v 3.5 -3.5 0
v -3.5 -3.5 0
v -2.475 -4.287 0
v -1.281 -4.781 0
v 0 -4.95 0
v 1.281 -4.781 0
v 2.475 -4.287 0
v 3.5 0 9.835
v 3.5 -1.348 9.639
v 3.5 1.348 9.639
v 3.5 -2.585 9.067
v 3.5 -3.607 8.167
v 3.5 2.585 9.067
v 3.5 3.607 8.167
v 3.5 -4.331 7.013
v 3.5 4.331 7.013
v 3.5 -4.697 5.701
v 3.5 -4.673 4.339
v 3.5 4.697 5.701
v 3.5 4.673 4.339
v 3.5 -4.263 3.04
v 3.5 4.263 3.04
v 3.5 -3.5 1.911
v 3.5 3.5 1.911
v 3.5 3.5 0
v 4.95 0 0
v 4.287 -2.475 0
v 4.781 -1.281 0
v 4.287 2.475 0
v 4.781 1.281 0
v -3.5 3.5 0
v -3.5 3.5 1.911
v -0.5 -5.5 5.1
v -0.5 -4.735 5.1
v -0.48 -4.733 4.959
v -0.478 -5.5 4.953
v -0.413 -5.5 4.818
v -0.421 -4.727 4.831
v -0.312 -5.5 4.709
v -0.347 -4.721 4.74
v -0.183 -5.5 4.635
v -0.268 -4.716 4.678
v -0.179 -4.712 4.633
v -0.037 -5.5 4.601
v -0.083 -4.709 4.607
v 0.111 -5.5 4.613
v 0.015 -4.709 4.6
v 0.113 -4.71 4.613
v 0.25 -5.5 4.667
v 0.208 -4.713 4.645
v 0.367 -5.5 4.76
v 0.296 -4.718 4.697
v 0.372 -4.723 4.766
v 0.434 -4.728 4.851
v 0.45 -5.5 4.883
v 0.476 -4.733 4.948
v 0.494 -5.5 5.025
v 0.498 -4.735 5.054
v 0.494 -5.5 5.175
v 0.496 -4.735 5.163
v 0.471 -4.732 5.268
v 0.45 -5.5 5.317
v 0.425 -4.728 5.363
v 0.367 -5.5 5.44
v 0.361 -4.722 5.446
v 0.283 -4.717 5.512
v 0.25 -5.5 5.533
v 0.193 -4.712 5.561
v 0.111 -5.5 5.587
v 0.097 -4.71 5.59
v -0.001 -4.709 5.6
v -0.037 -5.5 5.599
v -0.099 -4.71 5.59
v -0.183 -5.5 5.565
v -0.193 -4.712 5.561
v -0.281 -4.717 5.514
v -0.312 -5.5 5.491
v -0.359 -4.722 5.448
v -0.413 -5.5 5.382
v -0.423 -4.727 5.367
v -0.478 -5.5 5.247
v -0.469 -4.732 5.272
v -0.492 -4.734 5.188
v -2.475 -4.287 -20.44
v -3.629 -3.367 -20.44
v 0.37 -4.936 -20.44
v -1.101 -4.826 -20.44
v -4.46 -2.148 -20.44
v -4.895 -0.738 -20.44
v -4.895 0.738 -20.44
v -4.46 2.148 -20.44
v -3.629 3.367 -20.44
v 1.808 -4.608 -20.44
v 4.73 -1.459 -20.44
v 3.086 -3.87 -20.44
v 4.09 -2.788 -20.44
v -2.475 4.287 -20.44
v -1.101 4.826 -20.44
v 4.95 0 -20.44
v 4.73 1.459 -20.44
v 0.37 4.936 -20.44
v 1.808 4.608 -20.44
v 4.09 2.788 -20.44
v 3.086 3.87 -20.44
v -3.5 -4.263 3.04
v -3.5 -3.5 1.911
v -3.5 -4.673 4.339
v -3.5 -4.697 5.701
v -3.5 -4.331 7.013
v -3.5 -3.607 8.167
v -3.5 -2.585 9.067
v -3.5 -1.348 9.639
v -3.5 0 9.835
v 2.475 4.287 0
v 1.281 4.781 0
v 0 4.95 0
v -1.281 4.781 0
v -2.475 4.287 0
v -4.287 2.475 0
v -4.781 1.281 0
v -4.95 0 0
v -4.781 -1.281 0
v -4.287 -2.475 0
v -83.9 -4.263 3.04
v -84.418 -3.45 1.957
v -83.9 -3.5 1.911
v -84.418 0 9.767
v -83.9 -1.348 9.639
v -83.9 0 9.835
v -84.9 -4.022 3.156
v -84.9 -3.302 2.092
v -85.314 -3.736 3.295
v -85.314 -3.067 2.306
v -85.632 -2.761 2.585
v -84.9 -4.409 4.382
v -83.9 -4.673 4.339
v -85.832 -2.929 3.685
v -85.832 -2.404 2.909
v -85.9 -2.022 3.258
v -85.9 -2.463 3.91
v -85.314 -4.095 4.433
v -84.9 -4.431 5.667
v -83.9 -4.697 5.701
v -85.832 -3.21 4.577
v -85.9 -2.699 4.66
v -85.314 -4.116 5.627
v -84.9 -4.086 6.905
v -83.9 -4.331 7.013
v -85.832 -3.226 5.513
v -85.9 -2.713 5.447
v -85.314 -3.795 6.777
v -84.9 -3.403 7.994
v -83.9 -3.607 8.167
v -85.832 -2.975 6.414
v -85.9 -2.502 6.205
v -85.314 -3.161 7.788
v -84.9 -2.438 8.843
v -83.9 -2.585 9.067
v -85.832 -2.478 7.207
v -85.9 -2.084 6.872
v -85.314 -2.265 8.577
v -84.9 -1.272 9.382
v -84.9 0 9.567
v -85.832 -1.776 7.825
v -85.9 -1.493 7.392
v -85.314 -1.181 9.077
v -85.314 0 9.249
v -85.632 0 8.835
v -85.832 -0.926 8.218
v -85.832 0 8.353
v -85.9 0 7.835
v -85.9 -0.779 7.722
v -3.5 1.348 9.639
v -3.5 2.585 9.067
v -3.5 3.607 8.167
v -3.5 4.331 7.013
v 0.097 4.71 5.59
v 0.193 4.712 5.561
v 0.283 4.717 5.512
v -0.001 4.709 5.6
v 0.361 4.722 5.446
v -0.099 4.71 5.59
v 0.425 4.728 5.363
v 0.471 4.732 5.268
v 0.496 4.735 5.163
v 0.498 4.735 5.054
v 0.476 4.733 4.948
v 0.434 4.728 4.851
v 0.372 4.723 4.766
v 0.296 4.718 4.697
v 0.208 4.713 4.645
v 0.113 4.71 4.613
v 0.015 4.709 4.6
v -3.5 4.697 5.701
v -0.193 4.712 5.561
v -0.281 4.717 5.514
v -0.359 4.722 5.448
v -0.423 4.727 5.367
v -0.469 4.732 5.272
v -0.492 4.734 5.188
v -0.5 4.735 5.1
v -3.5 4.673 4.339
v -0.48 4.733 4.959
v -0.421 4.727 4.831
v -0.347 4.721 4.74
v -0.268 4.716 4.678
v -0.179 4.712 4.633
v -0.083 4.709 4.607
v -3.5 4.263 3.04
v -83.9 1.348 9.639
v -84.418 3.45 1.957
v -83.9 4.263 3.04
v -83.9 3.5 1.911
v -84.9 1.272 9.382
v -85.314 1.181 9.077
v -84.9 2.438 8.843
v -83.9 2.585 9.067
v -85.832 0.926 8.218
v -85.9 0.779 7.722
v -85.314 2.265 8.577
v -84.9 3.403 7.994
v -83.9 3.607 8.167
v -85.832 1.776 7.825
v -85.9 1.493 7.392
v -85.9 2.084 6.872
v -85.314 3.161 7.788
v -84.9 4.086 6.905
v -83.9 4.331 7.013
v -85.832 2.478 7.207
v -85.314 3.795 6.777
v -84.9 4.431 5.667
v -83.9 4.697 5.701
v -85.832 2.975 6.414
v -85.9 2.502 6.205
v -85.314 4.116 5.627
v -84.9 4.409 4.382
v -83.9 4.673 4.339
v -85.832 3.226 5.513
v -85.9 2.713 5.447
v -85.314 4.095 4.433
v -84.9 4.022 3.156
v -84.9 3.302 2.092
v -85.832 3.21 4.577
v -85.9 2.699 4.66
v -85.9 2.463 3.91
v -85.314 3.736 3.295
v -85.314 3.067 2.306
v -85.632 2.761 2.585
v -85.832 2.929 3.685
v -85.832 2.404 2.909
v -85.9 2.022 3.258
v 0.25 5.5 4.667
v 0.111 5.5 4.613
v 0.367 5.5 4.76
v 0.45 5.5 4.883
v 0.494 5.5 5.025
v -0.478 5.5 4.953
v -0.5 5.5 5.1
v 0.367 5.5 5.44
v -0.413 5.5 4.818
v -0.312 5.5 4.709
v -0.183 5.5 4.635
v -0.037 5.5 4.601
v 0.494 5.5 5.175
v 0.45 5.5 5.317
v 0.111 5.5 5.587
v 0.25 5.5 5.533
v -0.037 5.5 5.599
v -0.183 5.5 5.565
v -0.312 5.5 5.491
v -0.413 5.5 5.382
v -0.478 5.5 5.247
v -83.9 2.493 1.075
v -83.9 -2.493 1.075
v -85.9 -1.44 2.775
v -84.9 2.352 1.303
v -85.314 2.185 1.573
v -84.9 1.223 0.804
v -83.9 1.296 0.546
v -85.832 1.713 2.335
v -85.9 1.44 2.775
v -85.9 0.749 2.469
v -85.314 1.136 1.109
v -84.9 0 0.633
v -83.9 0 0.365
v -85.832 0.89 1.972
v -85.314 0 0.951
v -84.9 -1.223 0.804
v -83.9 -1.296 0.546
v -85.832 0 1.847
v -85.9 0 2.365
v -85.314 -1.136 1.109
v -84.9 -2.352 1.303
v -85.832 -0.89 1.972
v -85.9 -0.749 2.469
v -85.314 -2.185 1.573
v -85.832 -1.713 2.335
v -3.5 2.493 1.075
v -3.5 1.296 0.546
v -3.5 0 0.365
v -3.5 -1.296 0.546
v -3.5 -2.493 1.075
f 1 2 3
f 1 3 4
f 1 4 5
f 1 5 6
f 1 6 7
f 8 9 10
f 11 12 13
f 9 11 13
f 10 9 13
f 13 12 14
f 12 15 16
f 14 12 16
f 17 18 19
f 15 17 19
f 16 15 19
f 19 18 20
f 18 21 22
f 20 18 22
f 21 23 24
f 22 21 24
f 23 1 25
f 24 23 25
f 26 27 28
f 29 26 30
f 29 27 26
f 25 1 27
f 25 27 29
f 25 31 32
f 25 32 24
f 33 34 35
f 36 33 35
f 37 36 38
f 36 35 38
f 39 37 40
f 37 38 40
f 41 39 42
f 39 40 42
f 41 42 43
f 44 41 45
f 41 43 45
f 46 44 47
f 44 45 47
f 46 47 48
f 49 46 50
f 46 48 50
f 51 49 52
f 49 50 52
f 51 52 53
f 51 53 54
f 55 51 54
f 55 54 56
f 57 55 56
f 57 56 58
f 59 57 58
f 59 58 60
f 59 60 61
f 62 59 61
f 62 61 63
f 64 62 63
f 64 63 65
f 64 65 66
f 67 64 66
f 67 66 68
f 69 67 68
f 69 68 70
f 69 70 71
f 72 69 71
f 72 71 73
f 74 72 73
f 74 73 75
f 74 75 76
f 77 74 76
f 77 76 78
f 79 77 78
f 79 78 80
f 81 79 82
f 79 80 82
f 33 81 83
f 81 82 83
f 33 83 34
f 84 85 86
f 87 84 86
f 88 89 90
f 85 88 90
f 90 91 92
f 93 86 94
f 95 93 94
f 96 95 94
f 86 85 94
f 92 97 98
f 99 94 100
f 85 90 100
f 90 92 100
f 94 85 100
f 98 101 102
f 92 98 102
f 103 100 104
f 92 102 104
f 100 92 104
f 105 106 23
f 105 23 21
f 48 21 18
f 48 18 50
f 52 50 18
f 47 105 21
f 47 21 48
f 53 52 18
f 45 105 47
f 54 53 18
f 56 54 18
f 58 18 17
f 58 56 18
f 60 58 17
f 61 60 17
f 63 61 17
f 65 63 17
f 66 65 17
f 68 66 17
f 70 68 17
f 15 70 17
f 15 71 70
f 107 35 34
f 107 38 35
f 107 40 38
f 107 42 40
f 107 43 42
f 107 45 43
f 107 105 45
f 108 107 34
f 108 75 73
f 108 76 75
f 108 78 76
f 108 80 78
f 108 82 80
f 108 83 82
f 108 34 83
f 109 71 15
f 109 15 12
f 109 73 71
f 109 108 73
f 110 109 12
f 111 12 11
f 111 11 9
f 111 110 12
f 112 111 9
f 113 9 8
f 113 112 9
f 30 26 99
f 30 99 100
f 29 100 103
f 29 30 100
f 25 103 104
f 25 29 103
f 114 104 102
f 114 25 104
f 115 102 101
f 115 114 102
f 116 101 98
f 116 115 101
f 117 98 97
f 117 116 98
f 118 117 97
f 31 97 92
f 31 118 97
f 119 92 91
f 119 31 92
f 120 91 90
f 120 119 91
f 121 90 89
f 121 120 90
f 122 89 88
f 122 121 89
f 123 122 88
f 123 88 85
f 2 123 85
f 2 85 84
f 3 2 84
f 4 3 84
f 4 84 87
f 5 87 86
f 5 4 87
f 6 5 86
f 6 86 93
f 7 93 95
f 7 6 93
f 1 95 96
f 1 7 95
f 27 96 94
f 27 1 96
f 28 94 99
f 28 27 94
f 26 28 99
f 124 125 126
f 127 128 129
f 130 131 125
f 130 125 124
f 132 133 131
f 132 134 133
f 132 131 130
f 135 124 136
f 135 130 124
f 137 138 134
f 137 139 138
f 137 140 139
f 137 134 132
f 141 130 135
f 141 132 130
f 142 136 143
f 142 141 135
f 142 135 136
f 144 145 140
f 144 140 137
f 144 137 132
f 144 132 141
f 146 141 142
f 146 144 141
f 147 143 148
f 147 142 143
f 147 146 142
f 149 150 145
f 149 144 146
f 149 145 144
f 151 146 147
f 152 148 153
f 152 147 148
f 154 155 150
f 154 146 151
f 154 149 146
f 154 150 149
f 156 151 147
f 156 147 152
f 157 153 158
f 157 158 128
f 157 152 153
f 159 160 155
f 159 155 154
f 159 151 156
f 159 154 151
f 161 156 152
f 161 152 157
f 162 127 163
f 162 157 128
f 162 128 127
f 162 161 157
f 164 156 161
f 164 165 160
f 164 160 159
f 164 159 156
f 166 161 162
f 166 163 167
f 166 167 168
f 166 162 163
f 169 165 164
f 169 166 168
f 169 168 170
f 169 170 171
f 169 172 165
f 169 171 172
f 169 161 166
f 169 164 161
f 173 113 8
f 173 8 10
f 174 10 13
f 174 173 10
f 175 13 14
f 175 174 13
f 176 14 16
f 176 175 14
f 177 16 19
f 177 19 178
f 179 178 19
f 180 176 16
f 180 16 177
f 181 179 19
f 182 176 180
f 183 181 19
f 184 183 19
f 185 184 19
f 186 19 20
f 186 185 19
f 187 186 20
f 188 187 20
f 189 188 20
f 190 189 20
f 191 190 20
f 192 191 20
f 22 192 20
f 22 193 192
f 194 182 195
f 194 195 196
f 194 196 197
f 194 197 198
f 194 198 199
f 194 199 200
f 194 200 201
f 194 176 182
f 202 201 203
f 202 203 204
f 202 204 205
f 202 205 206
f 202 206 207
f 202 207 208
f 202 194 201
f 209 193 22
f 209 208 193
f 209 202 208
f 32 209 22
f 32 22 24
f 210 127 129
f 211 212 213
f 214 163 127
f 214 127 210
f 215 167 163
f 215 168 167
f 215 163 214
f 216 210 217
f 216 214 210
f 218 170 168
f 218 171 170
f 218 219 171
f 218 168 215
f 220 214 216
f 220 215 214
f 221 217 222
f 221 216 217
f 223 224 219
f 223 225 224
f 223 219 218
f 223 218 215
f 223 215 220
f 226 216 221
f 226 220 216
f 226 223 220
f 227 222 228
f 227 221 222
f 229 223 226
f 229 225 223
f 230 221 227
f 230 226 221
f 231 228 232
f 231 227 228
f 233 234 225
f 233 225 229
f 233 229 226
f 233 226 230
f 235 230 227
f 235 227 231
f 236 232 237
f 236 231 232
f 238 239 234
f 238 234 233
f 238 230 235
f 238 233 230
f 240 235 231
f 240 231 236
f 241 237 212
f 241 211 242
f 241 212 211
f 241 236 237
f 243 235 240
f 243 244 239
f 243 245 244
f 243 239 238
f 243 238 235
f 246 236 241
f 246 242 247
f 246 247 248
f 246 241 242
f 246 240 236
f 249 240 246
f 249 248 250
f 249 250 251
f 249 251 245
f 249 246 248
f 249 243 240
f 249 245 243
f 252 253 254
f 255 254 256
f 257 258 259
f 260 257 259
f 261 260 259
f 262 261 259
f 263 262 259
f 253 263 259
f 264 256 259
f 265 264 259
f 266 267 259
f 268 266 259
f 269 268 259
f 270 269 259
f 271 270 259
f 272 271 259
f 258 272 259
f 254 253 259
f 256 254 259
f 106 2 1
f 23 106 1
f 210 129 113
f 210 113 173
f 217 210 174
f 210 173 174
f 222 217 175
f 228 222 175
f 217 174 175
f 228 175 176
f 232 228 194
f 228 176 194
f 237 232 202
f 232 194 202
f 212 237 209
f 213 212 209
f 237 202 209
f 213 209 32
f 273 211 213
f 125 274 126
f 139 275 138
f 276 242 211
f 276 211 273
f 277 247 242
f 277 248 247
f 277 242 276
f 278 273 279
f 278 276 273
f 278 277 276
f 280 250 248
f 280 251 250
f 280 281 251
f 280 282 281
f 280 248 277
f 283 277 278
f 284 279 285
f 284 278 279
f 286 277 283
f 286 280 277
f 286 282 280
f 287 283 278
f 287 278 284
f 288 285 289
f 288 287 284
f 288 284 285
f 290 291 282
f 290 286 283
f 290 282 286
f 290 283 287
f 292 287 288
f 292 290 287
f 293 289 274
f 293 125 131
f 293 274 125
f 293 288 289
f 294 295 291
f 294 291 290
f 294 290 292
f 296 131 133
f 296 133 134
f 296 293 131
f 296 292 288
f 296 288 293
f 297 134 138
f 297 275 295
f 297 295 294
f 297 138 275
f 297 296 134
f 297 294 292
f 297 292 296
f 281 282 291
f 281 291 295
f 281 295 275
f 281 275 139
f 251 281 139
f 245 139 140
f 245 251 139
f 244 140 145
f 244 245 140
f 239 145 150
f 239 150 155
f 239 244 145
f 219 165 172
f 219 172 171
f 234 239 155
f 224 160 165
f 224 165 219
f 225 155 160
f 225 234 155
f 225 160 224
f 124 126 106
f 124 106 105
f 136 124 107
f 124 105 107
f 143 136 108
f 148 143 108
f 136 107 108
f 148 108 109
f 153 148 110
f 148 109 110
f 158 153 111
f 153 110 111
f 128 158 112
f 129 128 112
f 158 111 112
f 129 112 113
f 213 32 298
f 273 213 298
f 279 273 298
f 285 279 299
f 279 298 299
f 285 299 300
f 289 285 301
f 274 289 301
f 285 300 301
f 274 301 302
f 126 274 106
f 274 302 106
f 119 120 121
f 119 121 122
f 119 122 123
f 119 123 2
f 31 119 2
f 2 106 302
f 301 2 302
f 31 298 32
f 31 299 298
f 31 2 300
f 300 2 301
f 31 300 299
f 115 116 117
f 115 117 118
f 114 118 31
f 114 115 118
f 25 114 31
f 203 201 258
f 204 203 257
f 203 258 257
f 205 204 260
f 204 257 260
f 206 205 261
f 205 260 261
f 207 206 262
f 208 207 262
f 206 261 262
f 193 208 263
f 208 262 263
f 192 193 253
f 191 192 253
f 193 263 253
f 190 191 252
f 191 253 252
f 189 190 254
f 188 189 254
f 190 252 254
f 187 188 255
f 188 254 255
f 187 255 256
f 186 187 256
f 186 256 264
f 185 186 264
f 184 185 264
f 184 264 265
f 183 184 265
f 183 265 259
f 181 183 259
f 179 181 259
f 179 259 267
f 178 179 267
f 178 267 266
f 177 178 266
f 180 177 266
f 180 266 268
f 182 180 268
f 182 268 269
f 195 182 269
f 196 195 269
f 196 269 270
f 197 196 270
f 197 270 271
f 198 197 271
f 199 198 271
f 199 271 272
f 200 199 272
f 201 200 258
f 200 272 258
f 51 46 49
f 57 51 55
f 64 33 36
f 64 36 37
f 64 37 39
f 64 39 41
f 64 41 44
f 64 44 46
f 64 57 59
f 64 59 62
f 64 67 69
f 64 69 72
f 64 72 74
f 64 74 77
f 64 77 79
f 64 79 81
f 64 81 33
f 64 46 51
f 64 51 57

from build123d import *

# Parameters (mm, degrees)
SKETCH_1_R                  = 4.95
EXTRUDE_1_DEPTH             = 20.44
SKETCH_2_W                  = 7.000357134
SKETCH_2_H                  = 7.000357134
EXTRUDE_2_DEPTH             = 5.1
EXTRUDE_3_DEPTH             = 2
EXTRUDE_3_DEPTH_BACK        = 9.000357
EXTRUDE_4_DEPTH             = 82.4
EXTRUDE_4_DIRECTION_2_REACH = 24.791
FILLET_1_R                  = 2


with BuildPart() as part:
    # 草图1 → 凸台-拉伸1 (new body)
    with BuildSketch(Plane.XY):
        Circle(SKETCH_1_R)
    extrude(amount=-EXTRUDE_1_DEPTH)

    # 草图2 → 凸台-拉伸2 (add)
    with BuildSketch(Plane.XY):
        Rectangle(SKETCH_2_W, SKETCH_2_H)
    extrude(amount=EXTRUDE_2_DEPTH)

    # 草图3 → 凸台-拉伸3 (add, two sides: drawn at the far end of the back side and taken through both)
    with BuildSketch(Plane.XZ.offset(3.500178567).offset(-EXTRUDE_3_DEPTH_BACK)):
        with BuildLine():
            ThreePointArc((0.5, 5.1), (0, 5.6), (-0.5, 5.1))
            Line((-0.5, 5.1), (0.5, 5.1))
        make_face()
        with BuildLine():
            Line((0.5, 5.1), (-0.5, 5.1))
            ThreePointArc((-0.5, 5.1), (0, 4.6), (0.5, 5.1))
        make_face()
        with BuildLine():
            ThreePointArc((0.5, 5.1), (0, 5.6), (-0.5, 5.1))
            Line((-0.5, 5.1), (0.5, 5.1))
        make_face()
        with BuildLine():
            Line((0.5, 5.1), (-0.5, 5.1))
            ThreePointArc((-0.5, 5.1), (0, 4.6), (0.5, 5.1))
        make_face()
    extrude(amount=EXTRUDE_3_DEPTH + EXTRUDE_3_DEPTH_BACK)

    # 草图5 → 凸台-拉伸4 (add)
    with BuildSketch(Plane.ZY.offset(3.500178567)):
        with BuildLine():
            ThreePointArc((9.835, 0), (7.013225527, 4.331257679), (1.911116967, 3.500178567))
            Line((1.911116967, 3.500178567), (5.1, 3.500178567))
            Line((5.1, 3.500178567), (5.1, -3.500178567))
            Line((5.1, -3.500178567), (1.911116967, -3.500178567))
            ThreePointArc((1.911116967, -3.500178567), (7.013225527, -4.331257679), (9.835, 0))
        make_face()
        with BuildLine():
            Line((5.1, 3.500178567), (1.911116967, 3.500178567))
            ThreePointArc((1.911116967, 3.500178567), (0.365, 0), (1.911116967, -3.500178567))
            Line((1.911116967, -3.500178567), (5.1, -3.500178567))
            Line((5.1, -3.500178567), (5.1, 3.500178567))
        make_face()
        with BuildLine():
            ThreePointArc((9.835, 0), (7.013225527, 4.331257679), (1.911116967, 3.500178567))
            Line((1.911116967, 3.500178567), (5.1, 3.500178567))
            Line((5.1, 3.500178567), (5.1, -3.500178567))
            Line((5.1, -3.500178567), (1.911116967, -3.500178567))
            ThreePointArc((1.911116967, -3.500178567), (7.013225527, -4.331257679), (9.835, 0))
        make_face()
        with BuildLine():
            Line((5.1, 3.500178567), (1.911116967, 3.500178567))
            ThreePointArc((1.911116967, 3.500178567), (0.365, 0), (1.911116967, -3.500178567))
            Line((1.911116967, -3.500178567), (5.1, -3.500178567))
            Line((5.1, -3.500178567), (5.1, 3.500178567))
        make_face()
    extrude(amount=EXTRUDE_4_DEPTH)

    # 凸台-拉伸4 direction 2: up to this face of the body (flat: up to its plane)
    extrude_4_direction_2_end = Plane(part.part.faces().sort_by_distance((3.500178567, 0, 2.55))[0])
    # 草图5 → 凸台-拉伸4 direction 2 (add, up to the picked face)
    with BuildSketch(Plane.ZY.offset(3.500178567), mode=Mode.PRIVATE) as extrude_4_direction_2_sk1:
        with BuildLine():
            ThreePointArc((9.835, 0), (7.013225527, 4.331257679), (1.911116967, 3.500178567))
            Line((1.911116967, 3.500178567), (5.1, 3.500178567))
            Line((5.1, 3.500178567), (5.1, -3.500178567))
            Line((5.1, -3.500178567), (1.911116967, -3.500178567))
            ThreePointArc((1.911116967, -3.500178567), (7.013225527, -4.331257679), (9.835, 0))
        make_face()
    extrude_4_direction_2_tool1 = split(extrude(extrude_4_direction_2_sk1.sketch, amount=-EXTRUDE_4_DIRECTION_2_REACH, mode=Mode.PRIVATE), bisect_by=extrude_4_direction_2_end, keep=Keep.BOTH, mode=Mode.PRIVATE)
    # 草图5 → 凸台-拉伸4 direction 2 (add, up to the picked face)
    with BuildSketch(Plane.ZY.offset(3.500178567), mode=Mode.PRIVATE) as extrude_4_direction_2_sk2:
        with BuildLine():
            Line((5.1, 3.500178567), (1.911116967, 3.500178567))
            ThreePointArc((1.911116967, 3.500178567), (0.365, 0), (1.911116967, -3.500178567))
            Line((1.911116967, -3.500178567), (5.1, -3.500178567))
            Line((5.1, -3.500178567), (5.1, 3.500178567))
        make_face()
    extrude_4_direction_2_tool2 = split(extrude(extrude_4_direction_2_sk2.sketch, amount=-EXTRUDE_4_DIRECTION_2_REACH, mode=Mode.PRIVATE), bisect_by=extrude_4_direction_2_end, keep=Keep.BOTH, mode=Mode.PRIVATE)
    # 草图5 → 凸台-拉伸4 direction 2 (add, up to the picked face)
    with BuildSketch(Plane.ZY.offset(3.500178567), mode=Mode.PRIVATE) as extrude_4_direction_2_sk3:
        with BuildLine():
            ThreePointArc((9.835, 0), (7.013225527, 4.331257679), (1.911116967, 3.500178567))
            Line((1.911116967, 3.500178567), (5.1, 3.500178567))
            Line((5.1, 3.500178567), (5.1, -3.500178567))
            Line((5.1, -3.500178567), (1.911116967, -3.500178567))
            ThreePointArc((1.911116967, -3.500178567), (7.013225527, -4.331257679), (9.835, 0))
        make_face()
    extrude_4_direction_2_tool3 = split(extrude(extrude_4_direction_2_sk3.sketch, amount=-EXTRUDE_4_DIRECTION_2_REACH, mode=Mode.PRIVATE), bisect_by=extrude_4_direction_2_end, keep=Keep.BOTH, mode=Mode.PRIVATE)
    # 草图5 → 凸台-拉伸4 direction 2 (add, up to the picked face)
    with BuildSketch(Plane.ZY.offset(3.500178567), mode=Mode.PRIVATE) as extrude_4_direction_2_sk4:
        with BuildLine():
            Line((5.1, 3.500178567), (1.911116967, 3.500178567))
            ThreePointArc((1.911116967, 3.500178567), (0.365, 0), (1.911116967, -3.500178567))
            Line((1.911116967, -3.500178567), (5.1, -3.500178567))
            Line((5.1, -3.500178567), (5.1, 3.500178567))
        make_face()
    extrude_4_direction_2_tool4 = split(extrude(extrude_4_direction_2_sk4.sketch, amount=-EXTRUDE_4_DIRECTION_2_REACH, mode=Mode.PRIVATE), bisect_by=extrude_4_direction_2_end, keep=Keep.BOTH, mode=Mode.PRIVATE)
    add(extrude_4_direction_2_tool1.solids().sort_by(Axis((-3.500179, 0, 6.679951), (1, 0, 0)))[0])
    add(extrude_4_direction_2_tool2.solids().sort_by(Axis((-3.500179, 0, 2.947224), (1, 0, 0)))[0])
    add(extrude_4_direction_2_tool3.solids().sort_by(Axis((-3.500179, 0, 6.679951), (1, 0, 0)))[0])
    add(extrude_4_direction_2_tool4.solids().sort_by(Axis((-3.500179, 0, 2.947224), (1, 0, 0)))[0])

    # 圆角1
    fillet_1_edges = [part.edges().sort_by_distance(p)[0] for p in [
        (-85.900178567, -3.500178567, 8.288883033),
    ]]
    fillet(fillet_1_edges, radius=FILLET_1_R)


solid = part.part
